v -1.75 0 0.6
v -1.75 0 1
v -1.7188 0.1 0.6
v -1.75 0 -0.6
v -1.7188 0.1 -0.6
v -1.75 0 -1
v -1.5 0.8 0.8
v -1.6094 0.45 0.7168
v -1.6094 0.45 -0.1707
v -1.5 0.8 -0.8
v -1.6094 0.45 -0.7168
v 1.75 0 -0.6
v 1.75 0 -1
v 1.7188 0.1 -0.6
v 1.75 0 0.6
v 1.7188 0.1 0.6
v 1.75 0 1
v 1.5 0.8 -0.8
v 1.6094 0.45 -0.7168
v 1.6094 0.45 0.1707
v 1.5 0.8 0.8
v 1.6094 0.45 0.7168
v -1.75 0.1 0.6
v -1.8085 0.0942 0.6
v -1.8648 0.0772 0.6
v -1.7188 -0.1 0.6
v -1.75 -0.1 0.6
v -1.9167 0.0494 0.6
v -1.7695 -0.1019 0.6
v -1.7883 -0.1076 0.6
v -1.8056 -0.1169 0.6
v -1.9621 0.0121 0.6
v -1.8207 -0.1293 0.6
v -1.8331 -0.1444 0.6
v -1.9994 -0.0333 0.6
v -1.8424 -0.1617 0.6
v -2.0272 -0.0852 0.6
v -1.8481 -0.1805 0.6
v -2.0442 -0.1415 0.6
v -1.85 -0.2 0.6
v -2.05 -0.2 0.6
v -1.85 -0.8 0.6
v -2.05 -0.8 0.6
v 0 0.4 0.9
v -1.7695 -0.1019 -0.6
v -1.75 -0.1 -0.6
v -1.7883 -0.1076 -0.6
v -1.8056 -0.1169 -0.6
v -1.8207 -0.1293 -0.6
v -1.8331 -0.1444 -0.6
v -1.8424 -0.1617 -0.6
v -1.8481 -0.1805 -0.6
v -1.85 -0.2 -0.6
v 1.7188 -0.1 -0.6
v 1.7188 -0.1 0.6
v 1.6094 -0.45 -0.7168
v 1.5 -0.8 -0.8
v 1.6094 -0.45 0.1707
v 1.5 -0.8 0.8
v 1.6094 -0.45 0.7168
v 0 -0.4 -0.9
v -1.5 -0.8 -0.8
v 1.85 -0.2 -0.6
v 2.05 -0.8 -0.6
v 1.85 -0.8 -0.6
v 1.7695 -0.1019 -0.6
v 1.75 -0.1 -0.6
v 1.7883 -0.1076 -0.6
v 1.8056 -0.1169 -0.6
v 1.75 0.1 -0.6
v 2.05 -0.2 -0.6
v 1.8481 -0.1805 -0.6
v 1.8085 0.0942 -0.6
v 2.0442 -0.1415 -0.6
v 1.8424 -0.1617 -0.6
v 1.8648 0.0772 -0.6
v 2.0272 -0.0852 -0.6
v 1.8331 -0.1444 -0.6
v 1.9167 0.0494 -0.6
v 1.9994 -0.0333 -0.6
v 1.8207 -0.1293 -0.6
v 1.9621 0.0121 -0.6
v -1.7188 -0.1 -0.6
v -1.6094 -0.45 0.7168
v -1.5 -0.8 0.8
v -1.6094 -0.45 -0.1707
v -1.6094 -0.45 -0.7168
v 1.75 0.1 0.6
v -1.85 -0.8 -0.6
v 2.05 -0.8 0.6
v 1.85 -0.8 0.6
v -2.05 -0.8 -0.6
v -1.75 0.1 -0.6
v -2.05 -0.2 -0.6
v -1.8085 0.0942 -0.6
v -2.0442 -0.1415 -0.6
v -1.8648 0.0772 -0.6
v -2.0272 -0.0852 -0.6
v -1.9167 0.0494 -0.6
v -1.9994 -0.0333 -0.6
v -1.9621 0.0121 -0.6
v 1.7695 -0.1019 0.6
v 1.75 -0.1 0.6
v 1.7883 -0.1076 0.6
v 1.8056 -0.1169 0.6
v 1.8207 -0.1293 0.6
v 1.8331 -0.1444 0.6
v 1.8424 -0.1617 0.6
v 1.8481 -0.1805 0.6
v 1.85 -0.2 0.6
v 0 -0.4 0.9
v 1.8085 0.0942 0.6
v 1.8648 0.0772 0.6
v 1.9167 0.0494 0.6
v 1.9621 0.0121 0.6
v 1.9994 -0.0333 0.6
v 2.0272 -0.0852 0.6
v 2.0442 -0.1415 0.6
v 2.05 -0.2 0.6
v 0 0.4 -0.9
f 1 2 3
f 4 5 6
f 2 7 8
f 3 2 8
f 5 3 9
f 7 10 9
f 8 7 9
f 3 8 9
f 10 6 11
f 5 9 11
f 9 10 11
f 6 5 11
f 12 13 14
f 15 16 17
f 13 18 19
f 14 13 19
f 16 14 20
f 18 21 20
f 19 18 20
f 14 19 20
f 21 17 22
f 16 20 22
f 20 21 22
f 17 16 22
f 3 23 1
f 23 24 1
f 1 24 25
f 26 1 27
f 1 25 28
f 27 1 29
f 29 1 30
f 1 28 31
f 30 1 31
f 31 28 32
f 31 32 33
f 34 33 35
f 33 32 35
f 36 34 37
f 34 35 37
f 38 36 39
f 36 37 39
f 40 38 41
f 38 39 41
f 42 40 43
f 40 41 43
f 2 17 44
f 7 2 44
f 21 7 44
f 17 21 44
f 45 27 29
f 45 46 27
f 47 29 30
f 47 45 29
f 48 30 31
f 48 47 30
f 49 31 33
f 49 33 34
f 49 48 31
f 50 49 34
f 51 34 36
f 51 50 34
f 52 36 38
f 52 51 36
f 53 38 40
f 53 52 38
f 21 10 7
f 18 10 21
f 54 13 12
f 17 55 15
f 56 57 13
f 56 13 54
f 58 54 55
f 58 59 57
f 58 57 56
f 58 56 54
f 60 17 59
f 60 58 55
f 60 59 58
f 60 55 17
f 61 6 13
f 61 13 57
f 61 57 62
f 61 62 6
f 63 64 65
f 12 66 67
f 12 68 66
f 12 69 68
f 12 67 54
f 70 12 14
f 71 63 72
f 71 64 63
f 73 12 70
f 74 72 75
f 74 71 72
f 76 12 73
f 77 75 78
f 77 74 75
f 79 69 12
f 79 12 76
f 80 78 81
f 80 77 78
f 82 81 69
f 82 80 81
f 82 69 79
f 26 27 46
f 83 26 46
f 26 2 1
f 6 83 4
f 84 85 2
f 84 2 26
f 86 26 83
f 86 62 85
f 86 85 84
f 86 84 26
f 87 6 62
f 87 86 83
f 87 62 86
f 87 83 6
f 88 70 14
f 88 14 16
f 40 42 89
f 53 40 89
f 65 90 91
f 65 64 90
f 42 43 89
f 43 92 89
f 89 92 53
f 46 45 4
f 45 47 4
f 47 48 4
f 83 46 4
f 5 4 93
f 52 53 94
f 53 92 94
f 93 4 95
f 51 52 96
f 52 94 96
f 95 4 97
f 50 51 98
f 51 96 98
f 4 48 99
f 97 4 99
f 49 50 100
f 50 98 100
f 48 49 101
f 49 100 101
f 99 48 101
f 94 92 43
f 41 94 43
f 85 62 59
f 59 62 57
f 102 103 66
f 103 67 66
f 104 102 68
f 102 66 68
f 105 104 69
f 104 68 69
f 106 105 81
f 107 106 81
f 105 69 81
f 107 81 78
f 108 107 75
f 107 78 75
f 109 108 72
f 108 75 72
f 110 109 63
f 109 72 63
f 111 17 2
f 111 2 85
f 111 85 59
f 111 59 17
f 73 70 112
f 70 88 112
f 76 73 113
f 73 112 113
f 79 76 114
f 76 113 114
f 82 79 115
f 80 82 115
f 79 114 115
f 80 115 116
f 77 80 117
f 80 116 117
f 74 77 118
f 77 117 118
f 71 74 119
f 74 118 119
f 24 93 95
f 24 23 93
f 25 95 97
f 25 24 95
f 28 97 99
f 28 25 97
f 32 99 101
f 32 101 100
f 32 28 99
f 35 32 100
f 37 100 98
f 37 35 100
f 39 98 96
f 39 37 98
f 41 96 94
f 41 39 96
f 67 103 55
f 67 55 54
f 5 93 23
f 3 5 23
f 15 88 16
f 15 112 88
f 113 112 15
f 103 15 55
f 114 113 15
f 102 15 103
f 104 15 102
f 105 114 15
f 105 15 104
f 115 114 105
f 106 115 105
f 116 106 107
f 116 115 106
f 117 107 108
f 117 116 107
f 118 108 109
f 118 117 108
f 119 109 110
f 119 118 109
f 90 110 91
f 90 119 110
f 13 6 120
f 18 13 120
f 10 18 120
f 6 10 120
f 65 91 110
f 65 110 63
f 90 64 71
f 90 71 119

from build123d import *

# Parameters (mm, degrees)
SKETCH4_W = 1.2
SKETCH4_H = 0.2


with BuildPart() as part:
    # Base → Loft1 section 0
    with BuildSketch(Plane(origin=(0, 0, 0), x_dir=(1, 0, 0), z_dir=(0, 1, 0))):
        with BuildLine():
            Line((-1.75, 1), (1.75, 1))
            Line((1.75, 1), (1.75, -1))
            Line((1.75, -1), (-1.75, -1))
            Line((-1.75, -1), (-1.75, 1))
        make_face()
    # Top → Loft1 section 1
    with BuildSketch(Plane(origin=(0, 0.8, 0), x_dir=(1, 0, 0), z_dir=(0, 1, 0))):
        with BuildLine():
            Line((-1.5, 0.8), (1.5, 0.8))
            Line((1.5, 0.8), (1.5, -0.8))
            Line((1.5, -0.8), (-1.5, -0.8))
            Line((-1.5, -0.8), (-1.5, 0.8))
        make_face()
    loft1 = loft()

    # Mirror1: Loft1 across plane
    add(loft1.mirror(Plane.ZX))

    # Sweep1: sweep along a path in Sketch3
    with BuildLine(Plane.XY) as sweep1_path:
        Line((1.55, 0), (1.75, 0))
        ThreePointArc((1.75, 0), (1.891421356, -0.058578644), (1.95, -0.2))
        Line((1.95, -0.2), (1.95, -0.8))
    # Sketch4 → Sweep1 (sweep)
    with BuildSketch(Plane(origin=(1.55, 0, 0), x_dir=(0, 0, -1), z_dir=(1, 0, 0))):
        Rectangle(SKETCH4_W, SKETCH4_H)
    sweep1 = sweep(path=sweep1_path.line)

    # Mirror3: Sweep1 across plane
    add(sweep1.mirror(Plane(origin=(0, 0, 0), x_dir=(0, 0, 1), z_dir=(1, 0, 0))))


solid = part.part
